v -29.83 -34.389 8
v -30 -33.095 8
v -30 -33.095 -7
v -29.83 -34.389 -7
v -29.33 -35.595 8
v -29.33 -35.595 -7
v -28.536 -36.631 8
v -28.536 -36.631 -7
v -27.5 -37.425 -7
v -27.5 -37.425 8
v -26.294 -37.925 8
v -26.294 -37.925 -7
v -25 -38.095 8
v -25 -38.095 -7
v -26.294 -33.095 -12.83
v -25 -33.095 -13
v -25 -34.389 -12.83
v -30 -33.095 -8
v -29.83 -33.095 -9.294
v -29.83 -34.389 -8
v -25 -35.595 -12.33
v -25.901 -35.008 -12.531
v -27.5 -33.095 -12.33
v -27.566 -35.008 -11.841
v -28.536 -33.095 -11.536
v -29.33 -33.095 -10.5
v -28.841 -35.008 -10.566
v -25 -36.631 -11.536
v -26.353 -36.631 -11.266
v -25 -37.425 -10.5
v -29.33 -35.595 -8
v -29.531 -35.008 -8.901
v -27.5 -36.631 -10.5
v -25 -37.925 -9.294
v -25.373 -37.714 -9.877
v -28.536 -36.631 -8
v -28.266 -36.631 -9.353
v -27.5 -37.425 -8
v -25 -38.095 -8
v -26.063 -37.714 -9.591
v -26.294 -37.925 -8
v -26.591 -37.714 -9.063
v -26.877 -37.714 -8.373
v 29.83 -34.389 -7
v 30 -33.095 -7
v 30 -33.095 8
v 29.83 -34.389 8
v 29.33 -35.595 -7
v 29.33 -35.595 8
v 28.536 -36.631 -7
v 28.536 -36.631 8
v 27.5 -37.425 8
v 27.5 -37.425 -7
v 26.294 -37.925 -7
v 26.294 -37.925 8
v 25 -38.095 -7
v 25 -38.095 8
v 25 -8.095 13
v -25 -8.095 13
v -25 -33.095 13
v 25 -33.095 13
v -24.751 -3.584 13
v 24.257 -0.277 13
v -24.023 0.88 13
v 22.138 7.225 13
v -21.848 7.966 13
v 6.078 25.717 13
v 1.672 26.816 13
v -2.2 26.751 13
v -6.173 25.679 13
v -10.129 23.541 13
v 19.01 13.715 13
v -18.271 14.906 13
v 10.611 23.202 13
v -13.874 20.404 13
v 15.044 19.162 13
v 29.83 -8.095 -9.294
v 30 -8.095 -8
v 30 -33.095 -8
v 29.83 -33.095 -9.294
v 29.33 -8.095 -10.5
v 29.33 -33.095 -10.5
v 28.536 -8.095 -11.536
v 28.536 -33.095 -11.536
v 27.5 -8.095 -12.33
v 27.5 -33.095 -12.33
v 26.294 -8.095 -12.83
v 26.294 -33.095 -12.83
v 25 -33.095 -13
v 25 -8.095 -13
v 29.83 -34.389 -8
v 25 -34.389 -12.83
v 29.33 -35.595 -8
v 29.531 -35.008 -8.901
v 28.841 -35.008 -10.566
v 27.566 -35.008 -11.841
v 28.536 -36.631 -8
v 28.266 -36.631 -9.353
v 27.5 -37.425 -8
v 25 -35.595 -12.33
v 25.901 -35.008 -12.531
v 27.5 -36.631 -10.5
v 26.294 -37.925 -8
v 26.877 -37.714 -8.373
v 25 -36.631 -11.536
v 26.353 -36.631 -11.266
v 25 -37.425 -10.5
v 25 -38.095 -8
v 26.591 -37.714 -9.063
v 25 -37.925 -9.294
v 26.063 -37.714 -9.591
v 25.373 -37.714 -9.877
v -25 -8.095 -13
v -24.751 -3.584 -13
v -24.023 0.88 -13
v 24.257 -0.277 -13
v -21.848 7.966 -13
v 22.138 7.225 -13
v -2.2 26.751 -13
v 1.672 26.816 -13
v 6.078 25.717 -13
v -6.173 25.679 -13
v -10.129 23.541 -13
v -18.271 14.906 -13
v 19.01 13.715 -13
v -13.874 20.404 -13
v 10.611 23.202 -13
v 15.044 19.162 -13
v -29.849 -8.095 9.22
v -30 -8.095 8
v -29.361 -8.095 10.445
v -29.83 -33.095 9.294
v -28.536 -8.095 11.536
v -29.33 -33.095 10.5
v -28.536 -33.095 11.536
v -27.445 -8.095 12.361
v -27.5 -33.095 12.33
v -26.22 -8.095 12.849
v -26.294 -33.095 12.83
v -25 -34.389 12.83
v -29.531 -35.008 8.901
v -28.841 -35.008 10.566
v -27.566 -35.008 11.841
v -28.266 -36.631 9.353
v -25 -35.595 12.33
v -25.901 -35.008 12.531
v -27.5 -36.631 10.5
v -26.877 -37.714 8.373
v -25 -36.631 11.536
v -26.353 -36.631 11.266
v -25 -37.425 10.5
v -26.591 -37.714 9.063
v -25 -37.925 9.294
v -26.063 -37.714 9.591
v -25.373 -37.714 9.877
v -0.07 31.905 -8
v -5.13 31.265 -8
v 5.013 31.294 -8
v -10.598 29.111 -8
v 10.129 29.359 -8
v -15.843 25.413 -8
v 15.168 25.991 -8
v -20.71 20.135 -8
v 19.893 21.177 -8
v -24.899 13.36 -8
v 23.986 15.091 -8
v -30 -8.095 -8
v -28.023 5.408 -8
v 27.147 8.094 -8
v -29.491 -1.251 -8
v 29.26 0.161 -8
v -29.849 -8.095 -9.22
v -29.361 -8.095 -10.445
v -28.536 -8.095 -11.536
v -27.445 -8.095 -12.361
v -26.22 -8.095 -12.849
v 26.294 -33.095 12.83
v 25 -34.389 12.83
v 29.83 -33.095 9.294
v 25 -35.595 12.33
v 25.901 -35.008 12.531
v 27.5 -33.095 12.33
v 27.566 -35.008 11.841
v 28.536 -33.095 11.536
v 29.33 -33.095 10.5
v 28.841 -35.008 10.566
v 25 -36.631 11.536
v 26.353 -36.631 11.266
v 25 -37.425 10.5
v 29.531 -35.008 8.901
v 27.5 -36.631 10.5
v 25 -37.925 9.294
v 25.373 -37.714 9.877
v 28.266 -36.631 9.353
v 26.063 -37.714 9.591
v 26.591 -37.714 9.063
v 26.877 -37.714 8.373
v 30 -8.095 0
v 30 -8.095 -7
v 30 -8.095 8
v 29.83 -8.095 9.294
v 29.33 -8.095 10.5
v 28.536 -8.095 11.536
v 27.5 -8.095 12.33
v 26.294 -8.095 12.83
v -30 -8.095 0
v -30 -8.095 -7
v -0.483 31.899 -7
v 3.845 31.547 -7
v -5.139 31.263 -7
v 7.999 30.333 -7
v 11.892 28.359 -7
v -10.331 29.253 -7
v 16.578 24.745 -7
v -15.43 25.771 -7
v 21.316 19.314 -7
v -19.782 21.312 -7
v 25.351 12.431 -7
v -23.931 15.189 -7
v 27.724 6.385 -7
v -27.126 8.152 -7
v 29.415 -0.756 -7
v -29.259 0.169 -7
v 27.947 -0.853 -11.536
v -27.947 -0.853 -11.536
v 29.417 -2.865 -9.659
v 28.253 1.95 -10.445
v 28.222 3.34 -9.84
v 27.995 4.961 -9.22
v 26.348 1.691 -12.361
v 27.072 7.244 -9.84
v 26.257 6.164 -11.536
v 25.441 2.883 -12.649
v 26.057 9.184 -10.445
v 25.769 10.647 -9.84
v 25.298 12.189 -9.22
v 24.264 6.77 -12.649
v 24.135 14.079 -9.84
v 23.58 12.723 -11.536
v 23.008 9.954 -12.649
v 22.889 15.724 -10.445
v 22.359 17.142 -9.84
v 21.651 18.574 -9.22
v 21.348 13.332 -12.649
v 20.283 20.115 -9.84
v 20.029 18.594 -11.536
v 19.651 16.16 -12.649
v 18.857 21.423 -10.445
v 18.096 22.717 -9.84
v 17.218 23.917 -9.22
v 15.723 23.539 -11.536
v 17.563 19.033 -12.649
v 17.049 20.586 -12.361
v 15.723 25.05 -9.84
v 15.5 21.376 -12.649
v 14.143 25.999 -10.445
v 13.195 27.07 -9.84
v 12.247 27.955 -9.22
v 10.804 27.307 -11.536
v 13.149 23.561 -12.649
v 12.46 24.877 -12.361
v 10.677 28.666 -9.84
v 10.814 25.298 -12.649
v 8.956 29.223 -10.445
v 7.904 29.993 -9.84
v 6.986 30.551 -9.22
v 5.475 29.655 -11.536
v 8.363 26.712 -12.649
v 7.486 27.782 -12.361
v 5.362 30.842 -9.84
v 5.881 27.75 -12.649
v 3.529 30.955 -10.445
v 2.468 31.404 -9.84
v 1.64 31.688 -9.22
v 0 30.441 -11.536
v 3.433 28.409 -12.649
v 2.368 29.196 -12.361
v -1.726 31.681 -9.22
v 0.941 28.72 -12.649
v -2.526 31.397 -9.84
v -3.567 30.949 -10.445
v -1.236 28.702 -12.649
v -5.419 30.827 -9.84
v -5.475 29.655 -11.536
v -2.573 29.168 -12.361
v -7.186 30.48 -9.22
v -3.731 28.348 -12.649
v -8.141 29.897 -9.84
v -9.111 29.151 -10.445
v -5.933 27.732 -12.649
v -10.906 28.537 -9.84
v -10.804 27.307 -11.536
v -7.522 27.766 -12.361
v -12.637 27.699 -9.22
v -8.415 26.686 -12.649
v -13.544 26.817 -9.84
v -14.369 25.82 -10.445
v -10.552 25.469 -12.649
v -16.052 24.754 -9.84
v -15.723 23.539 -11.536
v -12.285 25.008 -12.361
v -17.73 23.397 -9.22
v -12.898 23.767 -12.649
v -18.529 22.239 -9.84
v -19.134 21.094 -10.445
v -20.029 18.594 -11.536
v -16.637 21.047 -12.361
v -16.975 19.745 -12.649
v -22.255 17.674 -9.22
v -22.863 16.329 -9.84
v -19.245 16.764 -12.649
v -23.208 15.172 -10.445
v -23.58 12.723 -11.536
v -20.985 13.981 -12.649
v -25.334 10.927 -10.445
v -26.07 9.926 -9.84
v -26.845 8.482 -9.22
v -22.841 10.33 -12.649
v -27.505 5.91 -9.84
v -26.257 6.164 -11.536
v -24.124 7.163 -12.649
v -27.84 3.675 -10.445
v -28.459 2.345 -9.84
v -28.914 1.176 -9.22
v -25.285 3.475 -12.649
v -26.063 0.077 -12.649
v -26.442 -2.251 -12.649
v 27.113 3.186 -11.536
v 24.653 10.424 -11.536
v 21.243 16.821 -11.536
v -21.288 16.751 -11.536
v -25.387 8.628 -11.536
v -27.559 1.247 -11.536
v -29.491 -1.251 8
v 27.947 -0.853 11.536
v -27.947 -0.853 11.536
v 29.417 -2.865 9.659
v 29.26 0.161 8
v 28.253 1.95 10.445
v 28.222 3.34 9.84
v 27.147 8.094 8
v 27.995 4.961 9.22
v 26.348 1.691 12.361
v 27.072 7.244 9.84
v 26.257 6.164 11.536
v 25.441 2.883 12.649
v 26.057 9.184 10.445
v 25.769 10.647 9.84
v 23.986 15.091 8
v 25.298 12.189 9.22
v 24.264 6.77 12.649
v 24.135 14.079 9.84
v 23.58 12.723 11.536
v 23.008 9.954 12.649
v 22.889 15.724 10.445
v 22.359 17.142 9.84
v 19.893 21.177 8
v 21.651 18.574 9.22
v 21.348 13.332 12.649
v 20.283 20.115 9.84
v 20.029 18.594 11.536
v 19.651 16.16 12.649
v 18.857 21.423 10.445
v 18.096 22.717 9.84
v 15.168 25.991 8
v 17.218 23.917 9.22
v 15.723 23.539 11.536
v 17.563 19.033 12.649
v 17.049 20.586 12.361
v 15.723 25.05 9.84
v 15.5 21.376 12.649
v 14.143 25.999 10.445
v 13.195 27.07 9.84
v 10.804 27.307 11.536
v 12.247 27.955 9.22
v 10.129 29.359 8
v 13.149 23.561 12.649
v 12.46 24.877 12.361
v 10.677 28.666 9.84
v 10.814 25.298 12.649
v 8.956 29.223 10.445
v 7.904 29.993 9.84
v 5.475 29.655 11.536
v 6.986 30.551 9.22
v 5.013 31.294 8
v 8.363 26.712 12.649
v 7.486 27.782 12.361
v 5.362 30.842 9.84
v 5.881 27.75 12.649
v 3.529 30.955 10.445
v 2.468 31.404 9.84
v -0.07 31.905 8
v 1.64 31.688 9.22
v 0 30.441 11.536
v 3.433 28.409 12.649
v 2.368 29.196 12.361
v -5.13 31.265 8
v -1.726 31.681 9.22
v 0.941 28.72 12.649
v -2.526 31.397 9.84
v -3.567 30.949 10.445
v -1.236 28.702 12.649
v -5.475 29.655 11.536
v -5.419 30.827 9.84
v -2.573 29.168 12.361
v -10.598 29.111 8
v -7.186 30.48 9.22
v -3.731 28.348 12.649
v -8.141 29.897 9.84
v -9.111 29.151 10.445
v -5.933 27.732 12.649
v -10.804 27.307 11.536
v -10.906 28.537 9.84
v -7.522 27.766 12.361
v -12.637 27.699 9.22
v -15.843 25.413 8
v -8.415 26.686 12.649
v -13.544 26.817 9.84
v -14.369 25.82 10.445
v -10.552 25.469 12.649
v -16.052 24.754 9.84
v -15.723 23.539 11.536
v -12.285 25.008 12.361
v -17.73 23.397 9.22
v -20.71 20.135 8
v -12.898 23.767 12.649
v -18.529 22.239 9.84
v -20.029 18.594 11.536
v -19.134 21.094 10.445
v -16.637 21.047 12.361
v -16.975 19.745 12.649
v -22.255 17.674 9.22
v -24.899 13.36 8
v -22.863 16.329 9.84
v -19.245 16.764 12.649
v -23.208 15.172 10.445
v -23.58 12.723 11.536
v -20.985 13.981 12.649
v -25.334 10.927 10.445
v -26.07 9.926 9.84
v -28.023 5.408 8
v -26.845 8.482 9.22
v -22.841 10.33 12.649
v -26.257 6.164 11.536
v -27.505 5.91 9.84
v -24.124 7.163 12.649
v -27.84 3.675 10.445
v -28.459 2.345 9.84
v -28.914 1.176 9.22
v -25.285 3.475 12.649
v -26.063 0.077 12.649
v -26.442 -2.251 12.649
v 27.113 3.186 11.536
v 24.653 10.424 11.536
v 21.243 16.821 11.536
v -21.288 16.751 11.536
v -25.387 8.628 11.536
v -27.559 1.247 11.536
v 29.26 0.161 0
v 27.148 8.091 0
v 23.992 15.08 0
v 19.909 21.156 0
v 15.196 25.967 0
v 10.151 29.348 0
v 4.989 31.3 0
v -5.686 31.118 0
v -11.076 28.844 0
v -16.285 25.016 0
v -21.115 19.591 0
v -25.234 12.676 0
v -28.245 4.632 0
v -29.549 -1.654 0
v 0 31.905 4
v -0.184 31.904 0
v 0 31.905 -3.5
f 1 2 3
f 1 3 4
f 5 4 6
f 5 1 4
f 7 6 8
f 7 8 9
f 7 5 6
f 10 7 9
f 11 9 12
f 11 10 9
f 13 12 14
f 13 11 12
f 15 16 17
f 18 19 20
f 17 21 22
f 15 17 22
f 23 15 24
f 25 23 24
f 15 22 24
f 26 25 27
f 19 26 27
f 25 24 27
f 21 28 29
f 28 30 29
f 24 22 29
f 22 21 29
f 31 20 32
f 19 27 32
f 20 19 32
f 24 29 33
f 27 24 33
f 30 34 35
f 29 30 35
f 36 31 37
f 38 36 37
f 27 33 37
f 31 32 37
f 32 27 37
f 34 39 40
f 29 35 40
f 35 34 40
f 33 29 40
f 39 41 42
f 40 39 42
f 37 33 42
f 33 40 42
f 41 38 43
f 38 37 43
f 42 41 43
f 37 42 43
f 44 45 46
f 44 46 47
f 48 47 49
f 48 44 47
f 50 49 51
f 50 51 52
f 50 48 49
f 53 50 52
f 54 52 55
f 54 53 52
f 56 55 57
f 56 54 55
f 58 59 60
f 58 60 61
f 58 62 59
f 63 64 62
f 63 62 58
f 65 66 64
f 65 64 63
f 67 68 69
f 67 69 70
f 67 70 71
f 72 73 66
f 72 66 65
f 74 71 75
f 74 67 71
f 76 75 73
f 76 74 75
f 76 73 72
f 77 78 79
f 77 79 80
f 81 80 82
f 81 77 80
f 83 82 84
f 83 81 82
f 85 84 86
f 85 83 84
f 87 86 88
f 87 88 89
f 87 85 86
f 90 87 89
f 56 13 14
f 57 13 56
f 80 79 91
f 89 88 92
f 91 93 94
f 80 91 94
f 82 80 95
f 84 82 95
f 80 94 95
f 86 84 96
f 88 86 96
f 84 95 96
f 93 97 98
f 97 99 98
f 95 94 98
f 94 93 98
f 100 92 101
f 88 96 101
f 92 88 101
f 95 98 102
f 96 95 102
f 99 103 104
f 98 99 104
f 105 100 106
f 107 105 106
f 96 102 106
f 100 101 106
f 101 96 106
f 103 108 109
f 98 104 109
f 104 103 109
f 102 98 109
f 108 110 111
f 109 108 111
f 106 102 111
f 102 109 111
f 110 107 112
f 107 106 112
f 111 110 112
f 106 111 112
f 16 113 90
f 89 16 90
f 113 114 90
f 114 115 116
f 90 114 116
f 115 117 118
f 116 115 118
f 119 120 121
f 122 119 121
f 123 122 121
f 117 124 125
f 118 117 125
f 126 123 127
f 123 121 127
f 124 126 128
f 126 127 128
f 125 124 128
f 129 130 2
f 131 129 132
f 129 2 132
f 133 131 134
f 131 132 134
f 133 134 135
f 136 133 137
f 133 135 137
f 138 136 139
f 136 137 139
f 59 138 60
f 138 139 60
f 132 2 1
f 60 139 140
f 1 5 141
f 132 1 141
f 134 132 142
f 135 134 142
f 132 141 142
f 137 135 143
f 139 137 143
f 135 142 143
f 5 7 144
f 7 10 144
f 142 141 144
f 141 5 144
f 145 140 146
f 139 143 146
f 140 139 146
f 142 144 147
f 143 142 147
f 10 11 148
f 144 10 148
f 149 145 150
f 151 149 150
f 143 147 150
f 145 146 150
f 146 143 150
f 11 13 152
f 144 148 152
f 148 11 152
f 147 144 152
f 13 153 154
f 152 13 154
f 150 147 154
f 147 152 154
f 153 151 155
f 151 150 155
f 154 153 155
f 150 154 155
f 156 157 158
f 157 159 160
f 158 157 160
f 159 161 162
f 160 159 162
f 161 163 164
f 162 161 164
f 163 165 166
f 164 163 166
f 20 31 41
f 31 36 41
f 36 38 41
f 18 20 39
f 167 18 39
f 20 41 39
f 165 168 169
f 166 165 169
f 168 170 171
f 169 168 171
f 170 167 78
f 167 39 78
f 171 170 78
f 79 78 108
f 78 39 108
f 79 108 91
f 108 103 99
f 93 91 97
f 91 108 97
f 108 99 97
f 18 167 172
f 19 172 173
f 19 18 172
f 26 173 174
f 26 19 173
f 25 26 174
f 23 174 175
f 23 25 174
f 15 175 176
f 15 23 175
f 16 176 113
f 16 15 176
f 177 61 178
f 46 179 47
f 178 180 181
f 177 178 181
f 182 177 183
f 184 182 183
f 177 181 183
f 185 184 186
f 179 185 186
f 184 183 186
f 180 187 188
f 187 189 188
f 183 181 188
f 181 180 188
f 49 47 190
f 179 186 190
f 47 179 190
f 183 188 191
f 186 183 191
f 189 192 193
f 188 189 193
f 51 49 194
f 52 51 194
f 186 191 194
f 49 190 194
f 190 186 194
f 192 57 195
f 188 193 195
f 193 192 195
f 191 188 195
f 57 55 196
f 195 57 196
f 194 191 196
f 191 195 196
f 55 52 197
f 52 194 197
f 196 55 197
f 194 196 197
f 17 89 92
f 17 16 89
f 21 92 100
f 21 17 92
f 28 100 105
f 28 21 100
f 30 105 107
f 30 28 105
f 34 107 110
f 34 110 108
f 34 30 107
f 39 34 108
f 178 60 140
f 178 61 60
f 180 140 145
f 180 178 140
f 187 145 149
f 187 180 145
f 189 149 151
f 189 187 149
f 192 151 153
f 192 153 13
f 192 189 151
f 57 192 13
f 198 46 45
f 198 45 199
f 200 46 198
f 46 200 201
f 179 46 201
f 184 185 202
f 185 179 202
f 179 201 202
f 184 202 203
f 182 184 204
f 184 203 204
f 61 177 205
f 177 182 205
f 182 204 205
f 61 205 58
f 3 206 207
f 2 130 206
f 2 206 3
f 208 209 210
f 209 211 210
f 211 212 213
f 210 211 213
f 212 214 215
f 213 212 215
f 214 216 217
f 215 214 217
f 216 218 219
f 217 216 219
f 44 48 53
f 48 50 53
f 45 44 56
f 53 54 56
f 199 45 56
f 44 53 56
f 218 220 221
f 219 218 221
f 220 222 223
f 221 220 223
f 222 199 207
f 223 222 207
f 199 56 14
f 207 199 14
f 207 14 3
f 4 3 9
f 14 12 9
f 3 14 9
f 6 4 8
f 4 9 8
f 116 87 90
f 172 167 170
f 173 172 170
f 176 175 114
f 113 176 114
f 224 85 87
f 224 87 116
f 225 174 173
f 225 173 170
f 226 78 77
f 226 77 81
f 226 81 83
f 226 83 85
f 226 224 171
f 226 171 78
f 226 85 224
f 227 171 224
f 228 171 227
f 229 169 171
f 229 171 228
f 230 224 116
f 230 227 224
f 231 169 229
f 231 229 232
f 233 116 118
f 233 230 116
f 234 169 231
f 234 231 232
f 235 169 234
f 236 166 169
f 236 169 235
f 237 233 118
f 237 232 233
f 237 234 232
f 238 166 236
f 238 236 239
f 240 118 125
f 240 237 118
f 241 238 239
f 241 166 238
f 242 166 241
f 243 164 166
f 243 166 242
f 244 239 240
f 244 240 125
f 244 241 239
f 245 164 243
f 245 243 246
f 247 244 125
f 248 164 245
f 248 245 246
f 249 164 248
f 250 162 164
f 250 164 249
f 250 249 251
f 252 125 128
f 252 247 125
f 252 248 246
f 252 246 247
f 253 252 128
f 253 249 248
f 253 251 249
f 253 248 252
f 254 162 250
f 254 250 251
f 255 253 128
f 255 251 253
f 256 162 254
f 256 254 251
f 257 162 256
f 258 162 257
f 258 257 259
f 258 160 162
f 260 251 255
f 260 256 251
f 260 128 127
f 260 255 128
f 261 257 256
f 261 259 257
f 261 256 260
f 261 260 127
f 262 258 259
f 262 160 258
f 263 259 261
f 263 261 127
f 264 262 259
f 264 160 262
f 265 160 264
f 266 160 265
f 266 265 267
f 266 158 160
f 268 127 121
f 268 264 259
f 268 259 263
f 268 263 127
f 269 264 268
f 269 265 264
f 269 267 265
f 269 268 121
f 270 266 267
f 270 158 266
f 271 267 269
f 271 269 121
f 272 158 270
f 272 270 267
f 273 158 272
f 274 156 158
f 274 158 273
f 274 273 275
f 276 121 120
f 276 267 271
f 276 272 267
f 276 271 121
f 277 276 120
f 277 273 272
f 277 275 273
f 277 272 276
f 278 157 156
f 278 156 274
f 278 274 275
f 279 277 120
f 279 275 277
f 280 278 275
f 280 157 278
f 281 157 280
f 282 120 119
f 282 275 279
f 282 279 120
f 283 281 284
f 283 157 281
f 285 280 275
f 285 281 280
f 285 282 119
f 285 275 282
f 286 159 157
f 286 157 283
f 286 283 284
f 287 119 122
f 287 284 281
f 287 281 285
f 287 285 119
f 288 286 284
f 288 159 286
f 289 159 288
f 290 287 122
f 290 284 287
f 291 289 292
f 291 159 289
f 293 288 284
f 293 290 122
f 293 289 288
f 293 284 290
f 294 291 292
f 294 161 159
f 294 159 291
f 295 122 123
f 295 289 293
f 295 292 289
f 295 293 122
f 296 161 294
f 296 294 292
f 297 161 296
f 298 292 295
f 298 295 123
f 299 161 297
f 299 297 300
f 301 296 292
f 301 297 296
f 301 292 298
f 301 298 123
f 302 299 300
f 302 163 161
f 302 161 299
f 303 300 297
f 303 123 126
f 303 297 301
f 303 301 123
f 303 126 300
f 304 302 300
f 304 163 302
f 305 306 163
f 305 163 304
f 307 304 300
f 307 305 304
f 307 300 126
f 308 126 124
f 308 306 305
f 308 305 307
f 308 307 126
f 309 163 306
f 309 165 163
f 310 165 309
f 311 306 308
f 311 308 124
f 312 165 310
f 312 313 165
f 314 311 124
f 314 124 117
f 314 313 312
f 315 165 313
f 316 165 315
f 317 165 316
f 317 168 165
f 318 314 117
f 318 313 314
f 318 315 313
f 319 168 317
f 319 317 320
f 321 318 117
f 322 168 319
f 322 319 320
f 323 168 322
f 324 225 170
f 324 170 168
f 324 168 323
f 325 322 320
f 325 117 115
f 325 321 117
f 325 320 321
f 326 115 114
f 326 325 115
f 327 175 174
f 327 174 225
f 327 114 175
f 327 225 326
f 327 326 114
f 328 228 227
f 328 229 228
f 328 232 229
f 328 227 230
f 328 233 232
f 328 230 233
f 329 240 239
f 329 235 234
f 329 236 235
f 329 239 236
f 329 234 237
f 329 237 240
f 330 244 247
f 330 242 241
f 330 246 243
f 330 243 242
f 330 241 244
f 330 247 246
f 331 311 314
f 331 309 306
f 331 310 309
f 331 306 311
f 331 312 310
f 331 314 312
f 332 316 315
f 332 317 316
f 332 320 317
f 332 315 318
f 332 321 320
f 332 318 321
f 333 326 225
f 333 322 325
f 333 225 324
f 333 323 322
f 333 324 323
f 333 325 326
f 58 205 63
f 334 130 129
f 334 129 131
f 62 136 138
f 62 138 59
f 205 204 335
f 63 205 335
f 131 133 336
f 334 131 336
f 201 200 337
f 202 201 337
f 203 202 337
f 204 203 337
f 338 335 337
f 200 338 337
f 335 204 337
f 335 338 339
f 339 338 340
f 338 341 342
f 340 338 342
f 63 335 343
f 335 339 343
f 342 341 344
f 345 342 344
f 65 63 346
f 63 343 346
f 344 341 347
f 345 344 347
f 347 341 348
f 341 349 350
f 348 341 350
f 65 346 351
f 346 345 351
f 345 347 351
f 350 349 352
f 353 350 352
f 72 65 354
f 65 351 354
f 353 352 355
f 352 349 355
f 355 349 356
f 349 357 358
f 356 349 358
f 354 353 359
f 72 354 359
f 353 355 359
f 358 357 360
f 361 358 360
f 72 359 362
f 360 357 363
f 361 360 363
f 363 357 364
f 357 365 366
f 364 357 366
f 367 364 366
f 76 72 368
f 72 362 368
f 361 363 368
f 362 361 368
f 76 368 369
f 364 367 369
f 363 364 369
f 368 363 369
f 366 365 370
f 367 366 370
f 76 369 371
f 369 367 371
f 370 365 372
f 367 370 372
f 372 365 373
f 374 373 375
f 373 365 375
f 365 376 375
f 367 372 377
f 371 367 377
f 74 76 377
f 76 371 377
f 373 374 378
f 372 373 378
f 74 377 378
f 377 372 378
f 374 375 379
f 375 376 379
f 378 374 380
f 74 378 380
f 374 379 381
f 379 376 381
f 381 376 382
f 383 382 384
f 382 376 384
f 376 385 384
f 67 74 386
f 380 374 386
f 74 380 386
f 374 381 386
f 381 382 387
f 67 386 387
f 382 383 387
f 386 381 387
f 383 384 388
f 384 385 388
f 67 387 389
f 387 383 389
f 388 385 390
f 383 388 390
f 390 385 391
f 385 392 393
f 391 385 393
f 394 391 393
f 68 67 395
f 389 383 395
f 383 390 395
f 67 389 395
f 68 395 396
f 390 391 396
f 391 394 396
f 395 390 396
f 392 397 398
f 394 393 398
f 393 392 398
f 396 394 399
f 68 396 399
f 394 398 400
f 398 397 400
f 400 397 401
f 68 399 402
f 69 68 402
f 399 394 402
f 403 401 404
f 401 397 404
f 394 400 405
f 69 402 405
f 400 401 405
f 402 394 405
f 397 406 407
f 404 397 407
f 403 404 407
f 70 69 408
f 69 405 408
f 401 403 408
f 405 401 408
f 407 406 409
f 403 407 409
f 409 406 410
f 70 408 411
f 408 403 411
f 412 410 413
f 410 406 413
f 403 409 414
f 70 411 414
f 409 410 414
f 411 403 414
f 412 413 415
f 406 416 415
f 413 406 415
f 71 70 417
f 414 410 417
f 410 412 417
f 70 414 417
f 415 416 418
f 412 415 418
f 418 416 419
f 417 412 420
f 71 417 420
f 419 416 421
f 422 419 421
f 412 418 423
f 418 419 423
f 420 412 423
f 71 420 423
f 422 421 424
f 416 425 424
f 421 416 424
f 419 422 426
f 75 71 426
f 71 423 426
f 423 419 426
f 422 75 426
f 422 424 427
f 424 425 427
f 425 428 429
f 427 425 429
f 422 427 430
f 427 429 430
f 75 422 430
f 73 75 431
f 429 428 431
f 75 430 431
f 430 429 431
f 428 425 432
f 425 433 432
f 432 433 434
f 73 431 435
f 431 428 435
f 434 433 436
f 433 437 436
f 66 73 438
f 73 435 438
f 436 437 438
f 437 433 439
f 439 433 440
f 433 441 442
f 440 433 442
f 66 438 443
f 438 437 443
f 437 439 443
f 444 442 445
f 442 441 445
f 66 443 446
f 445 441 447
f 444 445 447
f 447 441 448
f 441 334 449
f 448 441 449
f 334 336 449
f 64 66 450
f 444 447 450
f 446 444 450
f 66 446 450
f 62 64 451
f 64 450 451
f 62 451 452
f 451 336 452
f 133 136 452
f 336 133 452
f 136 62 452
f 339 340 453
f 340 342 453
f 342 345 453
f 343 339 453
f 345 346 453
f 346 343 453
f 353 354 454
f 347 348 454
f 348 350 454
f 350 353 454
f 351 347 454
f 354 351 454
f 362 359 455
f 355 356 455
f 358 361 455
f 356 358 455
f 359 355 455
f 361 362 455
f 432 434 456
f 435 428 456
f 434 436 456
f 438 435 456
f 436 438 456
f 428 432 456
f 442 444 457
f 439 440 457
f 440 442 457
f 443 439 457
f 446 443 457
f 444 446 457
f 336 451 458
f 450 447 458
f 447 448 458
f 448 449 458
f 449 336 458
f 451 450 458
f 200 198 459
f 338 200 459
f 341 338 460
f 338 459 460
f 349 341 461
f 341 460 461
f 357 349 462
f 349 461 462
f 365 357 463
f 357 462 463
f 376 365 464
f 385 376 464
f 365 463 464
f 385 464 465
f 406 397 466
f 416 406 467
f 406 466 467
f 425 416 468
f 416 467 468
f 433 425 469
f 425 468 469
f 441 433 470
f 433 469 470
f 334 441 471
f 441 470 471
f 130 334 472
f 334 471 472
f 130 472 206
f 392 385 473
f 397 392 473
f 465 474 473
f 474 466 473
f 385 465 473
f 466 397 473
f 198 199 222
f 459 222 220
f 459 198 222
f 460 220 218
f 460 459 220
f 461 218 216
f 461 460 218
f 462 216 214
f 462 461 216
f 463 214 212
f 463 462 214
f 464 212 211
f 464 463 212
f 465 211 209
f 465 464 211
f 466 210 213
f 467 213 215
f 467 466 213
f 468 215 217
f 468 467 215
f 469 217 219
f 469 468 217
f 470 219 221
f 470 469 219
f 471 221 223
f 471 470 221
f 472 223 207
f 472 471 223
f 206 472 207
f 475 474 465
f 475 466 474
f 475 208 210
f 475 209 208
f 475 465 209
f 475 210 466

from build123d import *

# Parameters (mm, degrees)
F1_DEPTH = 13
F2_R     = 5
F3_R     = 5
F4_W     = 33.7748937309
F4_H     = 1
F4_W_2   = 35
F5_DEPTH = 70


# Not quite as in the source:
# - ends of sketch curves that miss each other by under 0.0002 mm in the source are joined
# - a feature of the source that left no trace in its solid (it failed there, or was rolled back) is left out


with BuildPart() as f1:
    # F0 (on Top) → F1 (new body, symmetric)
    with BuildSketch(Plane.XY):
        with BuildLine():
            Line((-30, -8.0950134536), (-30, -38.0950163982))
            Line((-30, -38.0950163982), (0, -38.0950163982))
            ThreePointArc((0, -38.0950163982), (-21.2132044767, -29.3082187928), (-30, -8.0950134536))
        make_face()
        with BuildLine():
            ThreePointArc((30, -8.0950163982), (21.2132034356, -29.3082198338), (0, -38.0950163982))
            Line((0, -38.0950163982), (30, -38.0950163982))
            Line((30, -38.0950163982), (30, -8.0950163982))
        make_face()
        with BuildLine():
            ThreePointArc((-30, -8.0950134536), (-21.2132044767, -29.3082187928), (0, -38.0950163982))
            ThreePointArc((0, -38.0950163982), (21.2132034356, -29.3082198338), (30, -8.0950163982))
            ThreePointArc((30, -8.0950163982), (1.4723e-06, 21.9049836018), (-30, -8.0950134536))
        make_face()
        with BuildLine():
            add(Edge.make_bspline(
                [(0, 31.9049836018), (-16.629870981, 31.9049836018), (-30, 11.955471457), (-30, -8.0950134536)],
                knots=[0, 0, 0, 0, 49.9999976443, 49.9999976443, 49.9999976443, 49.9999976443], degree=3))
            ThreePointArc((-30, -8.0950134536), (1.4723e-06, 21.9049836018), (30, -8.0950163982))
            add(Edge.make_bspline(
                [(0, 31.9049836018), (16.629870981, 31.9049836018), (30, 11.955471457), (30, -8.0950163982)],
                knots=[0, 0, 0, 0, 49.9999976443, 49.9999976443, 49.9999976443, 49.9999976443], degree=3))
        make_face()
    extrude(amount=F1_DEPTH, both=True)

    # F2
    f2_edges = [f1.edges().sort_by_distance(p)[0] for p in [
        (30, -23.095016, -13),
        (30, -23.095016, 13),
        (-30, -23.095015, 13),
        (-30, -23.095015, -13),
    ]]
    fillet(f2_edges, radius=F2_R)

    # F3
    f3_edges = [f1.edges().sort_by_distance(p)[0] for p in [
        (-30, -38.095016, 0),
        (-28.535534, -38.095016, -11.535534),
        (-28.535534, -38.095016, 11.535534),
        (0, -38.095016, -13),
        (0, -38.095016, 13),
        (28.535534, -38.095016, -11.535534),
        (28.535534, -38.095016, 11.535534),
        (30, -38.095016, 0),
    ]]
    fillet(f3_edges, radius=F3_R)

    # F4 (on face) → F5 (cut)
    with BuildSketch(Plane.XZ.offset(38.0950163982)):
        with Locations((-16.8874468654, -7.5)):
            Rectangle(F4_W, F4_H)
        with Locations((17.5, -7.5)):
            Rectangle(F4_W_2, F4_H)
    extrude(amount=-F5_DEPTH, mode=Mode.SUBTRACT)


solid = f1.part
